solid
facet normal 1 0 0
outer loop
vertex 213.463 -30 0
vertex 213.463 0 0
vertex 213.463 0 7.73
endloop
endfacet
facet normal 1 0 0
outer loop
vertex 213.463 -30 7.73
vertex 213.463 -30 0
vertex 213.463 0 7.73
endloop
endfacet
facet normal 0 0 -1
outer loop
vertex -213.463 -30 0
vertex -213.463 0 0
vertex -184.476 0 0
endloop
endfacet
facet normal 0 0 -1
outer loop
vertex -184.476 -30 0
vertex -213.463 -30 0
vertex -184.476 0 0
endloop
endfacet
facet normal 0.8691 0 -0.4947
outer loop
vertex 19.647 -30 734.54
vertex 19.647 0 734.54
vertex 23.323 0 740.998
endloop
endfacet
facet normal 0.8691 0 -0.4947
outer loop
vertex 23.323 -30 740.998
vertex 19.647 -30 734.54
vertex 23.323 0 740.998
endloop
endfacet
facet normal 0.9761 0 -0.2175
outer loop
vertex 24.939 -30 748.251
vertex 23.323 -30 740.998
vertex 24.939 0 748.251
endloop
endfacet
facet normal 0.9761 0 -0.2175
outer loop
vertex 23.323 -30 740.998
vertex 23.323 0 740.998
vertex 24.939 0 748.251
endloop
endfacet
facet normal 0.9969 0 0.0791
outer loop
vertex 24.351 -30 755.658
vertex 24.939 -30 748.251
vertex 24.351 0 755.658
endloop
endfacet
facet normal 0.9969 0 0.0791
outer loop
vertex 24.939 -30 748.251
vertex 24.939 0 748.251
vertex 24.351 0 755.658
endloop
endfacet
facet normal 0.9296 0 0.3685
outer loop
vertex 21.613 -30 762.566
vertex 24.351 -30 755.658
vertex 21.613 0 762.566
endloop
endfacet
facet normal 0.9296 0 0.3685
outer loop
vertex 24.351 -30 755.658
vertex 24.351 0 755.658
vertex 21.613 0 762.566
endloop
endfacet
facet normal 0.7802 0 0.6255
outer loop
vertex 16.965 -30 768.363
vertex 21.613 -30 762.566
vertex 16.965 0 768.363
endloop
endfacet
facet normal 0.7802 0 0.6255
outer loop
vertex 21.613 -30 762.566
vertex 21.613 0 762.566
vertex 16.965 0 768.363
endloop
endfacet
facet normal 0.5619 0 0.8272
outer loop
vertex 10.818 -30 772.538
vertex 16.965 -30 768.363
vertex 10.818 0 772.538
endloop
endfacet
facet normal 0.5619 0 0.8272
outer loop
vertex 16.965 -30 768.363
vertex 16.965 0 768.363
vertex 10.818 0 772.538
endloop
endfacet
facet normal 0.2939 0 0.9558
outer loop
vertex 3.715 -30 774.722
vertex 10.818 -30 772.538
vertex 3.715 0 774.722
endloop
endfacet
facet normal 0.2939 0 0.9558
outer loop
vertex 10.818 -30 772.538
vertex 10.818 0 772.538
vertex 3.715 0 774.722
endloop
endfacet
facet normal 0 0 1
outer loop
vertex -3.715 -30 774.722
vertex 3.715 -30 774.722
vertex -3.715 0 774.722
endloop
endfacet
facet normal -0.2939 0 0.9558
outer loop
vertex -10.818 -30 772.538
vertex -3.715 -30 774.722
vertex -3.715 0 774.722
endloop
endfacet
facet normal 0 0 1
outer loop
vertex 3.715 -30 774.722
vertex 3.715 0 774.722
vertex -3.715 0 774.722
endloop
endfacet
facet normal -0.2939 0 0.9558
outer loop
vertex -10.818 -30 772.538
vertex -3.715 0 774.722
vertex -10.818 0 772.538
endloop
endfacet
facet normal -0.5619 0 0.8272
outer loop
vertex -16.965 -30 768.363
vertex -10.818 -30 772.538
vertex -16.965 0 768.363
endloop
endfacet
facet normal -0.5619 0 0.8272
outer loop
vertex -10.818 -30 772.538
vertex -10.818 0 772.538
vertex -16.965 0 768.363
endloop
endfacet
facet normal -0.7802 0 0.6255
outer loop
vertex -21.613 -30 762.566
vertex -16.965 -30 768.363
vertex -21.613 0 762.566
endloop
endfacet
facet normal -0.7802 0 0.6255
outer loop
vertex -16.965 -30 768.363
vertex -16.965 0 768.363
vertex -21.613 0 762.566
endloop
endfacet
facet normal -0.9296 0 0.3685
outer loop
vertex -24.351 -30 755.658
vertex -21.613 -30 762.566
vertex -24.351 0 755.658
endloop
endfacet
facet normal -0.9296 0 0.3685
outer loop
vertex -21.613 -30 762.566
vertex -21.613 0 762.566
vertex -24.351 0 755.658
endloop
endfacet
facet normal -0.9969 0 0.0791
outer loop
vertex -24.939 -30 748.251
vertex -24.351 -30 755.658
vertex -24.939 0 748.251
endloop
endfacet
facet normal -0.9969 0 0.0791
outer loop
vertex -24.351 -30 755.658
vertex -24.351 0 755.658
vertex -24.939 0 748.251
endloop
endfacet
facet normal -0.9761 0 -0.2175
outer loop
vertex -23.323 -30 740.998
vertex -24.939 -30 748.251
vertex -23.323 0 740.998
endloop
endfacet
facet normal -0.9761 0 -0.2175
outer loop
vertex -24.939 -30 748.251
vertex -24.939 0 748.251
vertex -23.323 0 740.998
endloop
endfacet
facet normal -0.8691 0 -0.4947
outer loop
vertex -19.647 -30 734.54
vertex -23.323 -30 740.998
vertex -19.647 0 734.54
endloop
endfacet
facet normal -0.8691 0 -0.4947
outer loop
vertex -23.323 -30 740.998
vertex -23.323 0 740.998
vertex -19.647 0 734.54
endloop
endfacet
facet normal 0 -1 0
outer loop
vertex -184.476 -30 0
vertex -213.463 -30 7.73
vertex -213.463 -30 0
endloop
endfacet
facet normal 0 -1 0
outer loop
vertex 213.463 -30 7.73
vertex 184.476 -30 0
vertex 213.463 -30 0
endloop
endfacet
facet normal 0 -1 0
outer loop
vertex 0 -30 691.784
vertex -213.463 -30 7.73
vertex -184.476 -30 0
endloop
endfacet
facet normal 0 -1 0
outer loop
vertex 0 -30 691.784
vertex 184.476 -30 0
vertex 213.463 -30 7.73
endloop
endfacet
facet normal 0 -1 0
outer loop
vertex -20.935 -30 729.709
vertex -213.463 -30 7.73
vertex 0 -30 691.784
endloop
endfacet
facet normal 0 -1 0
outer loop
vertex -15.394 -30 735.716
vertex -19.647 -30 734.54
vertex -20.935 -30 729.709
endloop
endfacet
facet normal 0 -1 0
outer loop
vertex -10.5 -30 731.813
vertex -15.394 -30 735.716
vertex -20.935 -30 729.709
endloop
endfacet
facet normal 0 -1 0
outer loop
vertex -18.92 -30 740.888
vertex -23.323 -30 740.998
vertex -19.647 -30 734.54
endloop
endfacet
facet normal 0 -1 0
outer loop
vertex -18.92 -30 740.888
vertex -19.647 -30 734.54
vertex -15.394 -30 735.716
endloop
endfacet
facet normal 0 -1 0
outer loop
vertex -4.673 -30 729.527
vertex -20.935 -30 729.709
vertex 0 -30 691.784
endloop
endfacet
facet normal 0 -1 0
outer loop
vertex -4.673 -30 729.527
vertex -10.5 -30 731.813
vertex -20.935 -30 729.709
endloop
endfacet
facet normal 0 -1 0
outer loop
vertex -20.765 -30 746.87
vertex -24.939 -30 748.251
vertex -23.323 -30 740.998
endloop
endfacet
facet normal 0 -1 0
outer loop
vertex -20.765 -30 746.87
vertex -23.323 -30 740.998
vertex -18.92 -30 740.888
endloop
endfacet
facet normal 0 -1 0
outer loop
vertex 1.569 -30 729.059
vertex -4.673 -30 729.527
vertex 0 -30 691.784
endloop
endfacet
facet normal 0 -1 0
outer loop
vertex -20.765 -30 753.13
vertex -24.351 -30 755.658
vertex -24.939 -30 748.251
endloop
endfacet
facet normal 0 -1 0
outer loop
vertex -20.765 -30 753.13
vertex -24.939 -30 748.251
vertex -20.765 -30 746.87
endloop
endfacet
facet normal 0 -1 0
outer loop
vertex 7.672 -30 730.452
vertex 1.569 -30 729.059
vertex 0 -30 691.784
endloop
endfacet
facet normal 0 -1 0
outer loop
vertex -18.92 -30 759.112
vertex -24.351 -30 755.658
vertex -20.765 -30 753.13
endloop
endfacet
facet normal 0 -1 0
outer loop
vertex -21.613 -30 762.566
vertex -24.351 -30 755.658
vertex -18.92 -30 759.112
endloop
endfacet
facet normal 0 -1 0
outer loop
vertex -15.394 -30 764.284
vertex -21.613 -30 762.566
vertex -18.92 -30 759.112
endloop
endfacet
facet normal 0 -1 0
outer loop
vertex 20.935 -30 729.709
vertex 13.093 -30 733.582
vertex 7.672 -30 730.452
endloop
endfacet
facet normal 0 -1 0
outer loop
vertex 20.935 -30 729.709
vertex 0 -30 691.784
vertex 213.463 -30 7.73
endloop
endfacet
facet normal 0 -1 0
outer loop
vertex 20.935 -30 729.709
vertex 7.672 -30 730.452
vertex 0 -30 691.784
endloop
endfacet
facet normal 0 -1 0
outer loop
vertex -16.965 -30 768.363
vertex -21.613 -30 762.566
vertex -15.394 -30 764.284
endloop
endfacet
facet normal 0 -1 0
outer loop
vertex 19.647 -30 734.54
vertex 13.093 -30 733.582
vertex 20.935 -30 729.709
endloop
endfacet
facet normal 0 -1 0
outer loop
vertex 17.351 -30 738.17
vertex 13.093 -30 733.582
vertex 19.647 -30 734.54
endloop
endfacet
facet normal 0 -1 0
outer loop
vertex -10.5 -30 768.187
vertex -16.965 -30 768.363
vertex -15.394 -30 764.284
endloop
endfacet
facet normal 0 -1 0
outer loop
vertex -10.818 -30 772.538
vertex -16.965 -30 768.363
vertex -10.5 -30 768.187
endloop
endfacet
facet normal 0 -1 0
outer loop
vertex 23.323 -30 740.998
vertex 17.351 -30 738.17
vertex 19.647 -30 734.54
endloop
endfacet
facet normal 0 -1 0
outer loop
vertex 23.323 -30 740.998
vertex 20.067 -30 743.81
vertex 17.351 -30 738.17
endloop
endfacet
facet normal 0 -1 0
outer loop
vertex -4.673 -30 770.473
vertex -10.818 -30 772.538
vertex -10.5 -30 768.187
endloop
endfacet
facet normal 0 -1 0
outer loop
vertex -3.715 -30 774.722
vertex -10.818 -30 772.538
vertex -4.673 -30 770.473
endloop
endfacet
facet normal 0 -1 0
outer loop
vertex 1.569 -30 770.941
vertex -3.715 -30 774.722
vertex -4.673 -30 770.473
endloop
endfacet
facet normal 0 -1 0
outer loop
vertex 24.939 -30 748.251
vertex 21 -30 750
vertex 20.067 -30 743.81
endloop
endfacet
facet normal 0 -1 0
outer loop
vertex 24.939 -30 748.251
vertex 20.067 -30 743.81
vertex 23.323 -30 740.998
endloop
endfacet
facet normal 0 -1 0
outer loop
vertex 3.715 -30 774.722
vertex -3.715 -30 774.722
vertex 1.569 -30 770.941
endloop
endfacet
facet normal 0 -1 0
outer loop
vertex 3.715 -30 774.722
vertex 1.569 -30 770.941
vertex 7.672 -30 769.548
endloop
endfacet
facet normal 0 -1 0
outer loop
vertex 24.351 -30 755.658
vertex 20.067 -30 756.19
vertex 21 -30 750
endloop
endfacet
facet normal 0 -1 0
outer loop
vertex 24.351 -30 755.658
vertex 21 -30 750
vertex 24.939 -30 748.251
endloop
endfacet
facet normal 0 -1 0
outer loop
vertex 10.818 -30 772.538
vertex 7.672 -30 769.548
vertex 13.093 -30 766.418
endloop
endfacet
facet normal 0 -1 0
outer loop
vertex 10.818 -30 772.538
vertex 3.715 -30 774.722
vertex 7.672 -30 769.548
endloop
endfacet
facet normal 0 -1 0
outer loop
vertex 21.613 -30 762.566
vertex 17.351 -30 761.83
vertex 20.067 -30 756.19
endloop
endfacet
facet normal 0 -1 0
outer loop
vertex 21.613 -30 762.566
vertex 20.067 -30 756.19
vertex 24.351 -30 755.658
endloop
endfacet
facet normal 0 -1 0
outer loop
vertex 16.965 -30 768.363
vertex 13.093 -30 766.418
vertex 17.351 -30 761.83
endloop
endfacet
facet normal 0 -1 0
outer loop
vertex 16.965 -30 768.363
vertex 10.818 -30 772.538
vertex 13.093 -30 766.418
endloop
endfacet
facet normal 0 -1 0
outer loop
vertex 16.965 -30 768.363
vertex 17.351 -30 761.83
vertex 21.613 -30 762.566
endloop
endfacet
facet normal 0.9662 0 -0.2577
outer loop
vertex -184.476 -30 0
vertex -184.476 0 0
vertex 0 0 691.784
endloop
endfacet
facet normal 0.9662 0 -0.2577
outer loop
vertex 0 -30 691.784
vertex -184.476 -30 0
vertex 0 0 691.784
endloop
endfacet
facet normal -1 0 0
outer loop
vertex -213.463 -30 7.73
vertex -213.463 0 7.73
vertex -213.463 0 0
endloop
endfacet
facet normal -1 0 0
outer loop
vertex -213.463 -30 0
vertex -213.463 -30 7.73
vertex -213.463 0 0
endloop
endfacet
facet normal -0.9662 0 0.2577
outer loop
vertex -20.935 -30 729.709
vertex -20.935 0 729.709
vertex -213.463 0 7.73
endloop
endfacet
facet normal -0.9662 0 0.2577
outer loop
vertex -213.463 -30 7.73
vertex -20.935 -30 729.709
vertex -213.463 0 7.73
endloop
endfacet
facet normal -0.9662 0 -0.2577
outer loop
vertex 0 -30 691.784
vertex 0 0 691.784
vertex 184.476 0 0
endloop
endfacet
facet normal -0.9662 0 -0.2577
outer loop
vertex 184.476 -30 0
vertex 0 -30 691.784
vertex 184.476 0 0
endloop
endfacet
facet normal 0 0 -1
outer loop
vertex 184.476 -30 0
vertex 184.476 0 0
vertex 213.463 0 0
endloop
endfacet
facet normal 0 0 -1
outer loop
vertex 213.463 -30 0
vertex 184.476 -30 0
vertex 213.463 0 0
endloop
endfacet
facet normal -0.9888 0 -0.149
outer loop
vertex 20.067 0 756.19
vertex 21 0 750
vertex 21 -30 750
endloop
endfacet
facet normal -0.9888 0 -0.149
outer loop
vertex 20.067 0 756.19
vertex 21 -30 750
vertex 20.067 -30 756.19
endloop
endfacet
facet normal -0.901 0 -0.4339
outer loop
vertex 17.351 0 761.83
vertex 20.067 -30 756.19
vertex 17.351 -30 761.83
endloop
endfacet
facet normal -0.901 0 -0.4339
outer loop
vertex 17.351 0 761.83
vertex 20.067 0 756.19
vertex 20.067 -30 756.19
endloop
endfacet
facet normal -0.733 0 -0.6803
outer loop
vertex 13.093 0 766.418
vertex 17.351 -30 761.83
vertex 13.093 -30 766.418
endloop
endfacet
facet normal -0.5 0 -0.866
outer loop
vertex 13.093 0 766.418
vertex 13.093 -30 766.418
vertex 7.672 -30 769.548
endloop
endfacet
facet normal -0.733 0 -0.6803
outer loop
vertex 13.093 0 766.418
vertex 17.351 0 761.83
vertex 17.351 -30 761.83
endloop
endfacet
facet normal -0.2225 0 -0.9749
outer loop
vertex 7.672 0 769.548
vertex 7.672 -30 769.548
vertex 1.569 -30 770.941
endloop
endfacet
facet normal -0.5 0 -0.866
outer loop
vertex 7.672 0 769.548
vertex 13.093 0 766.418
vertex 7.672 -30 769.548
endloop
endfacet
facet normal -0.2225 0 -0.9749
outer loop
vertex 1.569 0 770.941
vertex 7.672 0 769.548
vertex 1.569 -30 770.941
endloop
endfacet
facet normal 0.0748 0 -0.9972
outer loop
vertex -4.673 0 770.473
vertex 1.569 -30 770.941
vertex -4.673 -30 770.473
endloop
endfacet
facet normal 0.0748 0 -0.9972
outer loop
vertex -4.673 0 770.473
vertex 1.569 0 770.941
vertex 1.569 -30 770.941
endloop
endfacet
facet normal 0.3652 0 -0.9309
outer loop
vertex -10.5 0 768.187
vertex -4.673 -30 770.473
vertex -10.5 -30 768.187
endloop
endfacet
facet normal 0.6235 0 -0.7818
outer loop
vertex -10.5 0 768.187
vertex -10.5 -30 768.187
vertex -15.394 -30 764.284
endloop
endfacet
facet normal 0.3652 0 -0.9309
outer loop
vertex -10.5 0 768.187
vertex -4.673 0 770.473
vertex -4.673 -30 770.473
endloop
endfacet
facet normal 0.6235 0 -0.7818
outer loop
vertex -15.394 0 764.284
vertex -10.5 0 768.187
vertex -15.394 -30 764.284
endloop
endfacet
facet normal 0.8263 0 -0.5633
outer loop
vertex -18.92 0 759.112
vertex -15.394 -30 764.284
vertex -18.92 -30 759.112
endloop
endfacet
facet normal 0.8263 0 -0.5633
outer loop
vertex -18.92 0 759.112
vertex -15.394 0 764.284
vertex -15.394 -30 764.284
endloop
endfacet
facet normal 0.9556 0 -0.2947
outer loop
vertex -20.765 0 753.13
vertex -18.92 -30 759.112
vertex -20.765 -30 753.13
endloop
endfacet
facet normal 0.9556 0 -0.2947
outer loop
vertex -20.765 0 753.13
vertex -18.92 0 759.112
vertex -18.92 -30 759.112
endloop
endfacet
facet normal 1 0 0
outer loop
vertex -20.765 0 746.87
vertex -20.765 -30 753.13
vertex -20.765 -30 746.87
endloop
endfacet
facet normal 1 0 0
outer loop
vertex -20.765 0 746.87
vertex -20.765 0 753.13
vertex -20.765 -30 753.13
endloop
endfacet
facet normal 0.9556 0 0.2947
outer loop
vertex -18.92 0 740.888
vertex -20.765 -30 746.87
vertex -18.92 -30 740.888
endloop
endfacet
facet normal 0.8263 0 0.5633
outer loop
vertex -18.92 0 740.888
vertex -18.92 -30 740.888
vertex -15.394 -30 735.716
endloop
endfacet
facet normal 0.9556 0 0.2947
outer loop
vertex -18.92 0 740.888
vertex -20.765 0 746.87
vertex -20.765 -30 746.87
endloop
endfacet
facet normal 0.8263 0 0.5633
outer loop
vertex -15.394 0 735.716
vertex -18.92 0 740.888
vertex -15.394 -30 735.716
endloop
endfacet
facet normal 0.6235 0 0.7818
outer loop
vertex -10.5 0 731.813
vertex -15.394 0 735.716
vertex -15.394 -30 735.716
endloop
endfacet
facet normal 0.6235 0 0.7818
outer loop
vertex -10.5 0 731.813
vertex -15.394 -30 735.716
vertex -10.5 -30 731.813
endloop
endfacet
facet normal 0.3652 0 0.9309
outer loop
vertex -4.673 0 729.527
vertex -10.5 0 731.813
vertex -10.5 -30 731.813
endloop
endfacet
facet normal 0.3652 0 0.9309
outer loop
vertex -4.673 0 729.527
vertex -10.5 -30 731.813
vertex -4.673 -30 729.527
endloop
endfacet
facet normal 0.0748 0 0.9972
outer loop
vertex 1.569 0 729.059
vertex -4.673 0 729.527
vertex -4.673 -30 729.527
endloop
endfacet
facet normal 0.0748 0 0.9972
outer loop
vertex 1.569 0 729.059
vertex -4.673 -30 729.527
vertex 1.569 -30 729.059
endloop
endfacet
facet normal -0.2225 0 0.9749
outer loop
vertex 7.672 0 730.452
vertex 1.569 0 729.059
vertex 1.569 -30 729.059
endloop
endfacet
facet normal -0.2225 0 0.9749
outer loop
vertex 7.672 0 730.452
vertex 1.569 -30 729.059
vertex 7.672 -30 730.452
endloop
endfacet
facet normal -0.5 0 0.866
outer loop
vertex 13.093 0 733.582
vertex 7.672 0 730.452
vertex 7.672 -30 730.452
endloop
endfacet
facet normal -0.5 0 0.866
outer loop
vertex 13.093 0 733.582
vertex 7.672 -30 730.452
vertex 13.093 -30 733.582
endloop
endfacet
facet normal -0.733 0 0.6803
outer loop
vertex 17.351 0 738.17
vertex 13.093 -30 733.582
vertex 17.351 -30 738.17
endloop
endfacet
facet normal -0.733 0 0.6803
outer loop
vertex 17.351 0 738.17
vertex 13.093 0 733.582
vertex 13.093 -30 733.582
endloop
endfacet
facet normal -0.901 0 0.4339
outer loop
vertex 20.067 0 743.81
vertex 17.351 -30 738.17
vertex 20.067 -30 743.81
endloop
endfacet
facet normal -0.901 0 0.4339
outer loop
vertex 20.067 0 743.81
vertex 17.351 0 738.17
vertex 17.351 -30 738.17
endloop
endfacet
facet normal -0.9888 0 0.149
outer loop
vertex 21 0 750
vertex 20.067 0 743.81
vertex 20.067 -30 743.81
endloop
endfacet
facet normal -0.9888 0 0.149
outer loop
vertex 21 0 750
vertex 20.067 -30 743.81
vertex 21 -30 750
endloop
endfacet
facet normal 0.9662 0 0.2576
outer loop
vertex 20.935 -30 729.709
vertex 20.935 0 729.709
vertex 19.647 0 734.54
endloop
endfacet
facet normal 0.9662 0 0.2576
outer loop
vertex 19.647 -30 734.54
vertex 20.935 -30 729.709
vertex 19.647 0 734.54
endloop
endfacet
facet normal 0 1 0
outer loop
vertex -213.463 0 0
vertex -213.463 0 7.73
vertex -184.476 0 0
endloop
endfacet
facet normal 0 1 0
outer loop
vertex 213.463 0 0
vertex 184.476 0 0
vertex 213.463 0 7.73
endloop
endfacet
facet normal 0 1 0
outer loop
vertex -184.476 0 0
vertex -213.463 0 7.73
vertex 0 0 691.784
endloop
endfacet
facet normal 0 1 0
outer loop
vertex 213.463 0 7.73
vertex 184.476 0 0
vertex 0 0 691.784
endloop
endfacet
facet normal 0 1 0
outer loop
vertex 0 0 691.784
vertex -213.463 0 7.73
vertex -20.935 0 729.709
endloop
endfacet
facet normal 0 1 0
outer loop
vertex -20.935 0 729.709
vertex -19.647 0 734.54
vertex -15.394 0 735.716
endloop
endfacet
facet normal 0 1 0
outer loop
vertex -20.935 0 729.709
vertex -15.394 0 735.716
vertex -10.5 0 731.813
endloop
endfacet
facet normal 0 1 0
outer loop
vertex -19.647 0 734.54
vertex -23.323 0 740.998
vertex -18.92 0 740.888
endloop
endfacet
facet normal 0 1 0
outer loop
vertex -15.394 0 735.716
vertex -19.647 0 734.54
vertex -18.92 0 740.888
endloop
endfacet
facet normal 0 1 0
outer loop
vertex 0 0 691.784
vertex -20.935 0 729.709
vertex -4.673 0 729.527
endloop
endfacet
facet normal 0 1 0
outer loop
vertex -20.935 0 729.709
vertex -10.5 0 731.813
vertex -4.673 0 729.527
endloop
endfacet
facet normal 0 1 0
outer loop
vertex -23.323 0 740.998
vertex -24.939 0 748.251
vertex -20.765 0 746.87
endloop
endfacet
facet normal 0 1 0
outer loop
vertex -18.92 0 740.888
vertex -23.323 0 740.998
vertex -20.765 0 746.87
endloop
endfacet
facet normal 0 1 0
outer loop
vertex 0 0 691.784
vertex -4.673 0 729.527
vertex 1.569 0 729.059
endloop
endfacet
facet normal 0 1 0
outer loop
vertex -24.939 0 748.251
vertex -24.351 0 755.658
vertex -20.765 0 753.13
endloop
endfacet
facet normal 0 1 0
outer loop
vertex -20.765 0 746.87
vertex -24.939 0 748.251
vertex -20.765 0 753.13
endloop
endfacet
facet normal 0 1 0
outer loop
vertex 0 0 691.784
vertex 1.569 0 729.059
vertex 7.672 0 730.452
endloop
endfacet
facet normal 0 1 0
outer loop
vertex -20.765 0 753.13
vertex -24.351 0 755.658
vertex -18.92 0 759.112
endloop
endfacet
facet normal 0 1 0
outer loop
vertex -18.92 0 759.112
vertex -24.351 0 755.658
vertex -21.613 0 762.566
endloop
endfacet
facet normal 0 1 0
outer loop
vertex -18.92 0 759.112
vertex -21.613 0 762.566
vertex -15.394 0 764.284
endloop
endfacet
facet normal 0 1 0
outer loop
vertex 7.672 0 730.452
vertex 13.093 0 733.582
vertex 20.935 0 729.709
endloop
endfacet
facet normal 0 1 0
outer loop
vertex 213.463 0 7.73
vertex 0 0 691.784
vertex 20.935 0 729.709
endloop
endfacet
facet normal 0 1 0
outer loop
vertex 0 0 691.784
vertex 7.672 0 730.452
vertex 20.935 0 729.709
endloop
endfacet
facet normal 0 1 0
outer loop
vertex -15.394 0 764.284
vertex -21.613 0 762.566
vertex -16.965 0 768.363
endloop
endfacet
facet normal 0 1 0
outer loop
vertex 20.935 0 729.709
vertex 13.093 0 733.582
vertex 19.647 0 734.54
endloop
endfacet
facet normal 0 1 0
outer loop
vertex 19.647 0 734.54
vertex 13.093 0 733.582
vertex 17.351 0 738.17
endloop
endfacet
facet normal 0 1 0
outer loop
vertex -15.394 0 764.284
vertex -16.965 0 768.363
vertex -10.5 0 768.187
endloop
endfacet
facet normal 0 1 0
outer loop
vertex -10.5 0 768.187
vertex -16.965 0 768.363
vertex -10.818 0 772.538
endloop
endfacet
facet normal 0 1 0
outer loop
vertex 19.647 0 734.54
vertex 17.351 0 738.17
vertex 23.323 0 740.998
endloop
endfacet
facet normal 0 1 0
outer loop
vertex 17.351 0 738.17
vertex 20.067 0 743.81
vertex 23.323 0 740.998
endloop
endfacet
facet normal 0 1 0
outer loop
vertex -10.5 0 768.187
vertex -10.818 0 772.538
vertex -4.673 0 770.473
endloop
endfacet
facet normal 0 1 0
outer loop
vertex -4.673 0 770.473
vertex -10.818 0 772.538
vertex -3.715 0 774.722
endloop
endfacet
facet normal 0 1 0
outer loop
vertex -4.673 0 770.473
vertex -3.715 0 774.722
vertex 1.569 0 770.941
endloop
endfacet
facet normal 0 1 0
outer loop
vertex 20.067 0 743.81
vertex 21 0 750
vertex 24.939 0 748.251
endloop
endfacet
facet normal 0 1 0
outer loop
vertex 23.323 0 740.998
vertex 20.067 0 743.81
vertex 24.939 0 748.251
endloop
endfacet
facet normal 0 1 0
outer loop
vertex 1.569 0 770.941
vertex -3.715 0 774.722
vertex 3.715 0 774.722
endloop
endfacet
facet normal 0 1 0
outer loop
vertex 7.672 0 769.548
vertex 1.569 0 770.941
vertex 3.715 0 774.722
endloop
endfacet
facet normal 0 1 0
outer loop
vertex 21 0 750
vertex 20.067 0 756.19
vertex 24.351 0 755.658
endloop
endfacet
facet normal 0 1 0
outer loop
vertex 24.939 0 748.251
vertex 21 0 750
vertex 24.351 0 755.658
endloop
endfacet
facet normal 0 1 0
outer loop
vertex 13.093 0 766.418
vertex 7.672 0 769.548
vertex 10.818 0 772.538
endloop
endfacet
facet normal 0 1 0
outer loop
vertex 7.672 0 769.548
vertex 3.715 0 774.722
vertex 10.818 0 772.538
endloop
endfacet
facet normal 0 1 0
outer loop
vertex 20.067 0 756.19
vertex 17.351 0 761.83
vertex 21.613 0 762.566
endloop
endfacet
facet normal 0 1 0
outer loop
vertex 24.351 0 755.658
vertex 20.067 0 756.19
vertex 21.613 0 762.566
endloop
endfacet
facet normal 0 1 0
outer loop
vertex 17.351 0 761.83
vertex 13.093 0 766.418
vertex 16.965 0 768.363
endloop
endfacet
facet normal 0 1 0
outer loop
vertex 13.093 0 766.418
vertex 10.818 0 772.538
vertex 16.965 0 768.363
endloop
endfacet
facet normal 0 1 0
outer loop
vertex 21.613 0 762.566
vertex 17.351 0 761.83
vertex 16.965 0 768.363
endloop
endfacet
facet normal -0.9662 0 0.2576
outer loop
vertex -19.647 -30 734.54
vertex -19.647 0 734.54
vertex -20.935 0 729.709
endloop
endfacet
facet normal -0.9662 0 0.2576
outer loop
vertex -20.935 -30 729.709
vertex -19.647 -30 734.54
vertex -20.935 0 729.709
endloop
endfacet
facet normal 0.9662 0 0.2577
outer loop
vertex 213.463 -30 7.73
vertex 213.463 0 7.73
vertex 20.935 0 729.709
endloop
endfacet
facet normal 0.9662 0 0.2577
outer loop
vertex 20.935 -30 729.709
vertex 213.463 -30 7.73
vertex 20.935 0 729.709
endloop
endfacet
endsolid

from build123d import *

# Parameters (mm, degrees)
F0_R     = 21
F1_DEPTH = 30


with BuildPart() as f1:
    # F0 (on Front) → F1 (new body)
    with BuildSketch(Plane.XZ):
        with BuildLine():
            Line((20.93509, 729.709066), (19.646777, 734.540241))
            ThreePointArc((19.646777, 734.540241), (15, 730), (9.340271, 726.810361))
            Line((9.340271, 726.810361), (8.051958, 721.979187))
            Line((8.051958, 721.979187), (0, 691.784345))
            Line((0, 691.784345), (184.475825, 0))
            Line((184.475825, 0), (213.462873, 0))
            Line((213.462873, 0), (213.462873, 7.72988))
            Line((213.462873, 7.72988), (20.93509, 729.709066))
        make_face()
        with BuildLine():
            Line((-20.93509, 729.709066), (-213.462873, 7.72988))
            Line((-213.462873, 7.72988), (-213.462873, 0))
            Line((-213.462873, 0), (-184.475825, 0))
            Line((-184.475825, 0), (0, 691.784345))
            Line((0, 691.784345), (-8.051958, 721.979187))
            Line((-8.051958, 721.979187), (-9.340271, 726.810361))
            ThreePointArc((-9.340271, 726.810361), (-15, 730), (-19.646777, 734.540241))
            Line((-19.646777, 734.540241), (-20.93509, 729.709066))
        make_face()
        with BuildLine():
            ThreePointArc((19.646777, 734.540241), (0, 775), (-19.646777, 734.540241))
            ThreePointArc((-19.646777, 734.540241), (-15, 730), (-9.340271, 726.810361))
            Line((-9.340271, 726.810361), (-8.051958, 721.979187))
            Line((-8.051958, 721.979187), (0, 691.784345))
            Line((0, 691.784345), (8.051958, 721.979187))
            Line((8.051958, 721.979187), (9.340271, 726.810361))
            ThreePointArc((9.340271, 726.810361), (15, 730), (19.646777, 734.540241))
        make_face()
        with Locations((0, 750)):
            Circle(F0_R, mode=Mode.SUBTRACT)
    extrude(amount=F1_DEPTH)


solid = f1.part
